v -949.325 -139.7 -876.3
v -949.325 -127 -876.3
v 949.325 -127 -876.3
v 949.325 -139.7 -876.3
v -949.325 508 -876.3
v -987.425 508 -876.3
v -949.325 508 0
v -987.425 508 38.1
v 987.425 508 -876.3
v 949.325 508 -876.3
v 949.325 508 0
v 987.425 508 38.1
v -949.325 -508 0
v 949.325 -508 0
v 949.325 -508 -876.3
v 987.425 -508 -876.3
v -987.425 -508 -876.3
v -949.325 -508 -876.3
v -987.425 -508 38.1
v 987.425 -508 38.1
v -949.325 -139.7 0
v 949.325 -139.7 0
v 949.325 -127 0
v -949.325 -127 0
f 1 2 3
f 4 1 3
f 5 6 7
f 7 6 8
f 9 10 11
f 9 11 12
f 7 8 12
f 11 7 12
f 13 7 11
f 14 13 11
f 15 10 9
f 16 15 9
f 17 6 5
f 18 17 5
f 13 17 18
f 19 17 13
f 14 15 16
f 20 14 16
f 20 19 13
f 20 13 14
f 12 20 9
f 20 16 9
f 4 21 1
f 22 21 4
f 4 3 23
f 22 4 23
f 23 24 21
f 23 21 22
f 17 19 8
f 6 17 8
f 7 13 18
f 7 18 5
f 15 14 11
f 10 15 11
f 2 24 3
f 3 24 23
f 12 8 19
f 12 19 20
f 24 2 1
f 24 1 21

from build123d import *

# Parameters (mm, degrees)
F0_W     = 38.1
F0_H     = 1016
F0_W_2   = 1898.65
F1_DEPTH = 38.1
F2_DEPTH = 876.3
F4_W     = 1898.65
F4_H     = 876.3
F5_DEPTH = 12.7


with BuildPart() as f1:
    # F0 (on Top) → F1 (new body)
    with BuildSketch(Plane.XY):
        with Locations((-968.375, 0)):
            Rectangle(F0_W, F0_H)
        Rectangle(F0_W_2, F0_H)
        with Locations((968.375, 0)):
            Rectangle(F0_W, F0_H)
    extrude(amount=F1_DEPTH)

    # F0 (on Top) → F2 (join)
    with BuildSketch(Plane.XY):
        with Locations((-968.375, 0)):
            Rectangle(F0_W, F0_H)
        with Locations((968.375, 0)):
            Rectangle(F0_W, F0_H)
    extrude(amount=-F2_DEPTH)


with BuildPart() as f5:
    # F4 (on offset) → F5 (new body)
    with BuildSketch(Plane.XZ.offset(127)):
        with Locations((0, -438.15)):
            Rectangle(F4_W, F4_H)
    extrude(amount=F5_DEPTH)


solid = Compound([f1.part, f5.part])
